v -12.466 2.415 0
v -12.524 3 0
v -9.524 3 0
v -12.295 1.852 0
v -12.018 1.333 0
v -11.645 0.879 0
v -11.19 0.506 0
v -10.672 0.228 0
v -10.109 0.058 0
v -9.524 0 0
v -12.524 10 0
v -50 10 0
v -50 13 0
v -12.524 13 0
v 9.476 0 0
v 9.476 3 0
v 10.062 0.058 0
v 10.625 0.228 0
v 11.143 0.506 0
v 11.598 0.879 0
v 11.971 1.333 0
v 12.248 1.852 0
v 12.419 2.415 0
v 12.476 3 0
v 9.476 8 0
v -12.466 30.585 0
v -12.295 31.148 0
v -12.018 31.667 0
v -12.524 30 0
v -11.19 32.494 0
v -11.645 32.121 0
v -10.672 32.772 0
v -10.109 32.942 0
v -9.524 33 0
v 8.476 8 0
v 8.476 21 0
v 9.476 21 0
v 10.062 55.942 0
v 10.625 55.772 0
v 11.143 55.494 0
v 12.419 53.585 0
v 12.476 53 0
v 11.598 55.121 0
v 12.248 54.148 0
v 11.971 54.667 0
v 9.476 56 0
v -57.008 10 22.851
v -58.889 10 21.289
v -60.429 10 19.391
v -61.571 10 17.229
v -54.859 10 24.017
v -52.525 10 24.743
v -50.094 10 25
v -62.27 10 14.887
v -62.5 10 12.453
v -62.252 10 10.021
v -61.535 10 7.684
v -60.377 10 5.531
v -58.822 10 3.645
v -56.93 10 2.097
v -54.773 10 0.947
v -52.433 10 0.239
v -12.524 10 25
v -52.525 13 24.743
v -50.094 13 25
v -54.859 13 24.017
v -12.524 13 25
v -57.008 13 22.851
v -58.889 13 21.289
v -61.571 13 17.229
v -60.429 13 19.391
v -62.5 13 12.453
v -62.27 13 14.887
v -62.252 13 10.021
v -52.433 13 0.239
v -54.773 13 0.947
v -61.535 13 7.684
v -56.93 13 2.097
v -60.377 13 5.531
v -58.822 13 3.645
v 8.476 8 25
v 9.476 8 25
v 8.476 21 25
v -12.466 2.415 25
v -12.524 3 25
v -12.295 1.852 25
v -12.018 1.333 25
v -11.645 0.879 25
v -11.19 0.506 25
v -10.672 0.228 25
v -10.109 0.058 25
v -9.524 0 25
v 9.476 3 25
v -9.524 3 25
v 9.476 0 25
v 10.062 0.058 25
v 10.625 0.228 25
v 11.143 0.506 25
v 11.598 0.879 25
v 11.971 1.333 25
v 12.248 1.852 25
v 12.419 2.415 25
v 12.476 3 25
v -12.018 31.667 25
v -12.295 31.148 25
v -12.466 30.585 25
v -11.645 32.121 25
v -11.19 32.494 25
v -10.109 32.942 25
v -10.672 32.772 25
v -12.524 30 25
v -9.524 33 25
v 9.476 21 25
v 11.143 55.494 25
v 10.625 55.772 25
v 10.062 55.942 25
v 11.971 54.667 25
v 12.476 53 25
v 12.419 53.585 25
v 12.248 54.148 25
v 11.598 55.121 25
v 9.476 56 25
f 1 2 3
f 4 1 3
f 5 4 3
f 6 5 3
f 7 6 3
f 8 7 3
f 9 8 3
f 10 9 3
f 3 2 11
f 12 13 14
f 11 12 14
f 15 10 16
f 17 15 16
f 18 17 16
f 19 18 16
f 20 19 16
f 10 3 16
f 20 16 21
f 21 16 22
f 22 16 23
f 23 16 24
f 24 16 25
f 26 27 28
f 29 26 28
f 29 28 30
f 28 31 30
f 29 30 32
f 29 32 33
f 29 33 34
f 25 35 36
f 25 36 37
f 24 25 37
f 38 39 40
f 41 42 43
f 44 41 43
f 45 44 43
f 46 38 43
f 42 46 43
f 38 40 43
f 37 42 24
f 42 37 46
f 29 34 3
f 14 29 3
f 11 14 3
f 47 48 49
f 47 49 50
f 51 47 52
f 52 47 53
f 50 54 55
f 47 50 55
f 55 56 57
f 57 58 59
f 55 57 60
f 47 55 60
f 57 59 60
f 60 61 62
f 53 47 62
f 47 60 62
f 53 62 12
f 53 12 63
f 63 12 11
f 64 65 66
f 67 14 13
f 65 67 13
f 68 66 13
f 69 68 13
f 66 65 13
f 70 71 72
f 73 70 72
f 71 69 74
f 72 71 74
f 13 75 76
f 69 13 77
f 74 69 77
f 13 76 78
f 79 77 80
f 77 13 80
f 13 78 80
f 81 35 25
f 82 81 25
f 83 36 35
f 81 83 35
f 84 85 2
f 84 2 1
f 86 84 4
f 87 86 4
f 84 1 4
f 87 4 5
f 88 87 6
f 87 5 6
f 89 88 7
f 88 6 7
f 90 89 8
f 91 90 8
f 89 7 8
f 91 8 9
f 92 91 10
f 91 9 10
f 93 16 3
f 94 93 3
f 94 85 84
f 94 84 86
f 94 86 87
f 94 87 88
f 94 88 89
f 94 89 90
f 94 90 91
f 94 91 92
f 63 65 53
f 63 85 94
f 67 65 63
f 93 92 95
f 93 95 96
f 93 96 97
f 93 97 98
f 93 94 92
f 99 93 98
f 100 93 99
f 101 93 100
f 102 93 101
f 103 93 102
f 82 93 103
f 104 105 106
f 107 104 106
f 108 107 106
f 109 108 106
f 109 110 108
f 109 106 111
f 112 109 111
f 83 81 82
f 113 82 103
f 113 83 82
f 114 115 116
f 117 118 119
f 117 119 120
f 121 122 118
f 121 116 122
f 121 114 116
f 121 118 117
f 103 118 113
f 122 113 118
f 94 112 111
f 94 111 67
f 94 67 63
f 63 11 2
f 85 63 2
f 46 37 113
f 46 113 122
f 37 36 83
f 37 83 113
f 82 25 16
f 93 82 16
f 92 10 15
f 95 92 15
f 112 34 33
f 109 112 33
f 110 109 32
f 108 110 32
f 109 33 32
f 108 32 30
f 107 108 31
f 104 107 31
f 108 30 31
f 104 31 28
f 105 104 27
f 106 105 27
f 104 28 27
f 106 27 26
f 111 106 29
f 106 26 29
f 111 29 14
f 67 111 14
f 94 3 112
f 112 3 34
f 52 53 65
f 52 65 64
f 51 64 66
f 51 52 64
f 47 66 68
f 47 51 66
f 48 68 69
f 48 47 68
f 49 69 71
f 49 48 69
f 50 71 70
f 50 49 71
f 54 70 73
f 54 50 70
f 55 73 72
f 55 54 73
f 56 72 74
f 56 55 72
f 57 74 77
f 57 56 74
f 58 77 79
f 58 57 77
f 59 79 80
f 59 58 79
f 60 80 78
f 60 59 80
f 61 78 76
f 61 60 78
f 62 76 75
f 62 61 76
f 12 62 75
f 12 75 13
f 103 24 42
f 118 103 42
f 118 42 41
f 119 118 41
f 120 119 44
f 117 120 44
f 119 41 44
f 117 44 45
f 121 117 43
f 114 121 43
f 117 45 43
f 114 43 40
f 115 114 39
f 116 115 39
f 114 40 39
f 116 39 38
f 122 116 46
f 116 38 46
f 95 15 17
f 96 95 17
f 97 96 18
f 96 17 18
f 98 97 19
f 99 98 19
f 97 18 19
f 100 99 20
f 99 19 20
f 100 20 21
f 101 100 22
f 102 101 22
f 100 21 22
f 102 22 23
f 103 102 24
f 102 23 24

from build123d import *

# Parameters (mm, degrees)
PAD_DEPTH    = 25
POCKET_DEPTH = 5


with BuildPart() as part:
    # Sketch → Pad (new body)
    with BuildSketch(Plane.XY):
        with BuildLine():
            Line((0, 0), (9.47649, 0))
            ThreePointArc((9.47649, 0), (11.59781, 0.87868), (12.47649, 3))
            Line((12.47649, 3), (12.47649, 53))
            ThreePointArc((12.47649, 53), (11.59781, 55.12132), (9.47649, 56))
            Line((9.47649, 21), (9.47649, 56))
            Line((8.47649, 21), (9.47649, 21))
            Line((8.47649, 21), (8.47649, 8))
            Line((8.47649, 8), (9.47649, 8))
            Line((9.47649, 8), (9.47649, 3))
            Line((9.47649, 3), (-9.52351, 3))
            Line((-9.52351, 3), (-9.52351, 33))
            ThreePointArc((-9.52351, 33), (-11.64483, 32.12132), (-12.52351, 30))
            Line((-12.52351, 30), (-12.52351, 13))
            Line((-12.52351, 13), (-62.52351, 13))
            Line((-62.52351, 13), (-62.52351, 10))
            Line((-62.52351, 10), (-12.52351, 10))
            Line((-12.52351, 10), (-12.52351, 3))
            ThreePointArc((-12.52351, 3), (-11.64483, 0.87868), (-9.52351, 0))
            Line((-9.52351, 0), (0, 0))
        make_face()
    extrude(amount=PAD_DEPTH)

    # Sketch001 (on Face10 of Pad) → Pocket (cut)
    with BuildSketch(Plane.XZ.offset(-10)):
        with BuildLine():
            ThreePointArc((-50, 25.000353), (-62.500176, 12.500176), (-50, 0))
            Line((-50, -4.568982), (-50, 0))
            Line((-68, -4.568982), (-50, -4.568982))
            Line((-68, 31), (-68, -4.568982))
            Line((-50, 31), (-68, 31))
            Line((-50, 25.000353), (-50, 31))
        make_face()
    extrude(amount=-POCKET_DEPTH, mode=Mode.SUBTRACT)


solid = part.part
